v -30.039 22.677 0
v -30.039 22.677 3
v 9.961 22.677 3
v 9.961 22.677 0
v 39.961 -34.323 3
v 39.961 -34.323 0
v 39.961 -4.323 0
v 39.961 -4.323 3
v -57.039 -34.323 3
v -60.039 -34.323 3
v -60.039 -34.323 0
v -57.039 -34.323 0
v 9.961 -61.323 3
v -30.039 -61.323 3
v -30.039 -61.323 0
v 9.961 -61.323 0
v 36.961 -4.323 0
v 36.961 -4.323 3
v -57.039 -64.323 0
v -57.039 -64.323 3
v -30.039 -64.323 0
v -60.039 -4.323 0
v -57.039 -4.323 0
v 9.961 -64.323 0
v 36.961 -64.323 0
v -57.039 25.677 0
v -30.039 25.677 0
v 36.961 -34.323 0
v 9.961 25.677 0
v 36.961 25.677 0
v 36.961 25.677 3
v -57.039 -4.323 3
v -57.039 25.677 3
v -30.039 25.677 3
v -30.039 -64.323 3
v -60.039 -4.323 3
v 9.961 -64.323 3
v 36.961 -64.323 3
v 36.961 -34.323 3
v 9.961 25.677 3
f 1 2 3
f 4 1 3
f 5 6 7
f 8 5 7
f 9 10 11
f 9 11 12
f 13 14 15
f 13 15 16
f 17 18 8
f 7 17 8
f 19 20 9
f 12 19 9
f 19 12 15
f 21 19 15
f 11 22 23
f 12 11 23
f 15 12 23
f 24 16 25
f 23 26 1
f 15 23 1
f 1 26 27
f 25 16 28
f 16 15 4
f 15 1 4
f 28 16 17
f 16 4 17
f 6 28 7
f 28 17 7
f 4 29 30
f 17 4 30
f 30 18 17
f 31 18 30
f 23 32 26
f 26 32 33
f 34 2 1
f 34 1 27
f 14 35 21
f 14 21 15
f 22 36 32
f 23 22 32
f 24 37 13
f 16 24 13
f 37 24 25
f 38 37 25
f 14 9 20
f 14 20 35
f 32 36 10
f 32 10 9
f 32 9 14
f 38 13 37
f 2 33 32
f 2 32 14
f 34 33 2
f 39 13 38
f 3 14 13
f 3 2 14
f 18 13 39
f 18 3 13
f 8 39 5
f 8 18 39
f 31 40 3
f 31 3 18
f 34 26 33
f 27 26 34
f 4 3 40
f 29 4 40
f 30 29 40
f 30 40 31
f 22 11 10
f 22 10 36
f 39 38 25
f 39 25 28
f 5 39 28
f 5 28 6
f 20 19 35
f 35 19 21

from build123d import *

# Parameters (mm, degrees)
ESQUISSE1_W             = 100
ESQUISSE1_H             = 90
BOSS_EXTRU_1_DEPTH      = 3
ENL_V_MAT_EXTRU_1_REACH = 90.04
ESQUISSE2_W             = 40
ESQUISSE2_H             = 3
ESQUISSE2_W_2           = 3
ESQUISSE2_H_2           = 30


with BuildPart() as part:
    # Esquisse1 → Boss.-Extru.1 (new body)
    with BuildSketch(Plane.XY):
        with Locations((-10.038524431, -19.32304038)):
            Rectangle(ESQUISSE1_W, ESQUISSE1_H)
    extrude(amount=BOSS_EXTRU_1_DEPTH)

    # Esquisse2 → Enlèv. mat.-Extru.1 (cut, up to next)
    with BuildSketch(Plane.XY.offset(3), mode=Mode.PRIVATE) as enl_v_mat_extru_1_sk1:
        with Locations((-10.038524431, 24.17695962)):
            Rectangle(ESQUISSE2_W, ESQUISSE2_H)
    enl_v_mat_extru_1_tool1 = extrude(enl_v_mat_extru_1_sk1.sketch, amount=-ENL_V_MAT_EXTRU_1_REACH, mode=Mode.PRIVATE) & part.part
    # Esquisse2 → Enlèv. mat.-Extru.1 (cut, up to next)
    with BuildSketch(Plane.XY.offset(3), mode=Mode.PRIVATE) as enl_v_mat_extru_1_sk2:
        with Locations((-58.538524431, 10.67695962)):
            Rectangle(ESQUISSE2_W_2, ESQUISSE2_H_2)
    enl_v_mat_extru_1_tool2 = extrude(enl_v_mat_extru_1_sk2.sketch, amount=-ENL_V_MAT_EXTRU_1_REACH, mode=Mode.PRIVATE) & part.part
    # Esquisse2 → Enlèv. mat.-Extru.1 (cut, up to next)
    with BuildSketch(Plane.XY.offset(3), mode=Mode.PRIVATE) as enl_v_mat_extru_1_sk3:
        with Locations((-58.538524431, -49.32304038)):
            Rectangle(ESQUISSE2_W_2, ESQUISSE2_H_2)
    enl_v_mat_extru_1_tool3 = extrude(enl_v_mat_extru_1_sk3.sketch, amount=-ENL_V_MAT_EXTRU_1_REACH, mode=Mode.PRIVATE) & part.part
    # Esquisse2 → Enlèv. mat.-Extru.1 (cut, up to next)
    with BuildSketch(Plane.XY.offset(3), mode=Mode.PRIVATE) as enl_v_mat_extru_1_sk4:
        with Locations((-10.038524431, -62.82304038)):
            Rectangle(ESQUISSE2_W, ESQUISSE2_H)
    enl_v_mat_extru_1_tool4 = extrude(enl_v_mat_extru_1_sk4.sketch, amount=-ENL_V_MAT_EXTRU_1_REACH, mode=Mode.PRIVATE) & part.part
    # Esquisse2 → Enlèv. mat.-Extru.1 (cut, up to next)
    with BuildSketch(Plane.XY.offset(3), mode=Mode.PRIVATE) as enl_v_mat_extru_1_sk5:
        with Locations((38.461475569, -49.32304038)):
            Rectangle(ESQUISSE2_W_2, ESQUISSE2_H_2)
    enl_v_mat_extru_1_tool5 = extrude(enl_v_mat_extru_1_sk5.sketch, amount=-ENL_V_MAT_EXTRU_1_REACH, mode=Mode.PRIVATE) & part.part
    # Esquisse2 → Enlèv. mat.-Extru.1 (cut, up to next)
    with BuildSketch(Plane.XY.offset(3), mode=Mode.PRIVATE) as enl_v_mat_extru_1_sk6:
        with Locations((38.461475569, 10.67695962)):
            Rectangle(ESQUISSE2_W_2, ESQUISSE2_H_2)
    enl_v_mat_extru_1_tool6 = extrude(enl_v_mat_extru_1_sk6.sketch, amount=-ENL_V_MAT_EXTRU_1_REACH, mode=Mode.PRIVATE) & part.part
    add(enl_v_mat_extru_1_tool1.solids().sort_by_distance((-10.038524, 24.17696, 3))[0], mode=Mode.SUBTRACT)
    add(enl_v_mat_extru_1_tool2.solids().sort_by_distance((-58.538524, 10.67696, 3))[0], mode=Mode.SUBTRACT)
    add(enl_v_mat_extru_1_tool3.solids().sort_by_distance((-58.538524, -49.32304, 3))[0], mode=Mode.SUBTRACT)
    add(enl_v_mat_extru_1_tool4.solids().sort_by_distance((-10.038524, -62.82304, 3))[0], mode=Mode.SUBTRACT)
    add(enl_v_mat_extru_1_tool5.solids().sort_by_distance((38.461476, -49.32304, 3))[0], mode=Mode.SUBTRACT)
    add(enl_v_mat_extru_1_tool6.solids().sort_by_distance((38.461476, 10.67696, 3))[0], mode=Mode.SUBTRACT)


solid = part.part
